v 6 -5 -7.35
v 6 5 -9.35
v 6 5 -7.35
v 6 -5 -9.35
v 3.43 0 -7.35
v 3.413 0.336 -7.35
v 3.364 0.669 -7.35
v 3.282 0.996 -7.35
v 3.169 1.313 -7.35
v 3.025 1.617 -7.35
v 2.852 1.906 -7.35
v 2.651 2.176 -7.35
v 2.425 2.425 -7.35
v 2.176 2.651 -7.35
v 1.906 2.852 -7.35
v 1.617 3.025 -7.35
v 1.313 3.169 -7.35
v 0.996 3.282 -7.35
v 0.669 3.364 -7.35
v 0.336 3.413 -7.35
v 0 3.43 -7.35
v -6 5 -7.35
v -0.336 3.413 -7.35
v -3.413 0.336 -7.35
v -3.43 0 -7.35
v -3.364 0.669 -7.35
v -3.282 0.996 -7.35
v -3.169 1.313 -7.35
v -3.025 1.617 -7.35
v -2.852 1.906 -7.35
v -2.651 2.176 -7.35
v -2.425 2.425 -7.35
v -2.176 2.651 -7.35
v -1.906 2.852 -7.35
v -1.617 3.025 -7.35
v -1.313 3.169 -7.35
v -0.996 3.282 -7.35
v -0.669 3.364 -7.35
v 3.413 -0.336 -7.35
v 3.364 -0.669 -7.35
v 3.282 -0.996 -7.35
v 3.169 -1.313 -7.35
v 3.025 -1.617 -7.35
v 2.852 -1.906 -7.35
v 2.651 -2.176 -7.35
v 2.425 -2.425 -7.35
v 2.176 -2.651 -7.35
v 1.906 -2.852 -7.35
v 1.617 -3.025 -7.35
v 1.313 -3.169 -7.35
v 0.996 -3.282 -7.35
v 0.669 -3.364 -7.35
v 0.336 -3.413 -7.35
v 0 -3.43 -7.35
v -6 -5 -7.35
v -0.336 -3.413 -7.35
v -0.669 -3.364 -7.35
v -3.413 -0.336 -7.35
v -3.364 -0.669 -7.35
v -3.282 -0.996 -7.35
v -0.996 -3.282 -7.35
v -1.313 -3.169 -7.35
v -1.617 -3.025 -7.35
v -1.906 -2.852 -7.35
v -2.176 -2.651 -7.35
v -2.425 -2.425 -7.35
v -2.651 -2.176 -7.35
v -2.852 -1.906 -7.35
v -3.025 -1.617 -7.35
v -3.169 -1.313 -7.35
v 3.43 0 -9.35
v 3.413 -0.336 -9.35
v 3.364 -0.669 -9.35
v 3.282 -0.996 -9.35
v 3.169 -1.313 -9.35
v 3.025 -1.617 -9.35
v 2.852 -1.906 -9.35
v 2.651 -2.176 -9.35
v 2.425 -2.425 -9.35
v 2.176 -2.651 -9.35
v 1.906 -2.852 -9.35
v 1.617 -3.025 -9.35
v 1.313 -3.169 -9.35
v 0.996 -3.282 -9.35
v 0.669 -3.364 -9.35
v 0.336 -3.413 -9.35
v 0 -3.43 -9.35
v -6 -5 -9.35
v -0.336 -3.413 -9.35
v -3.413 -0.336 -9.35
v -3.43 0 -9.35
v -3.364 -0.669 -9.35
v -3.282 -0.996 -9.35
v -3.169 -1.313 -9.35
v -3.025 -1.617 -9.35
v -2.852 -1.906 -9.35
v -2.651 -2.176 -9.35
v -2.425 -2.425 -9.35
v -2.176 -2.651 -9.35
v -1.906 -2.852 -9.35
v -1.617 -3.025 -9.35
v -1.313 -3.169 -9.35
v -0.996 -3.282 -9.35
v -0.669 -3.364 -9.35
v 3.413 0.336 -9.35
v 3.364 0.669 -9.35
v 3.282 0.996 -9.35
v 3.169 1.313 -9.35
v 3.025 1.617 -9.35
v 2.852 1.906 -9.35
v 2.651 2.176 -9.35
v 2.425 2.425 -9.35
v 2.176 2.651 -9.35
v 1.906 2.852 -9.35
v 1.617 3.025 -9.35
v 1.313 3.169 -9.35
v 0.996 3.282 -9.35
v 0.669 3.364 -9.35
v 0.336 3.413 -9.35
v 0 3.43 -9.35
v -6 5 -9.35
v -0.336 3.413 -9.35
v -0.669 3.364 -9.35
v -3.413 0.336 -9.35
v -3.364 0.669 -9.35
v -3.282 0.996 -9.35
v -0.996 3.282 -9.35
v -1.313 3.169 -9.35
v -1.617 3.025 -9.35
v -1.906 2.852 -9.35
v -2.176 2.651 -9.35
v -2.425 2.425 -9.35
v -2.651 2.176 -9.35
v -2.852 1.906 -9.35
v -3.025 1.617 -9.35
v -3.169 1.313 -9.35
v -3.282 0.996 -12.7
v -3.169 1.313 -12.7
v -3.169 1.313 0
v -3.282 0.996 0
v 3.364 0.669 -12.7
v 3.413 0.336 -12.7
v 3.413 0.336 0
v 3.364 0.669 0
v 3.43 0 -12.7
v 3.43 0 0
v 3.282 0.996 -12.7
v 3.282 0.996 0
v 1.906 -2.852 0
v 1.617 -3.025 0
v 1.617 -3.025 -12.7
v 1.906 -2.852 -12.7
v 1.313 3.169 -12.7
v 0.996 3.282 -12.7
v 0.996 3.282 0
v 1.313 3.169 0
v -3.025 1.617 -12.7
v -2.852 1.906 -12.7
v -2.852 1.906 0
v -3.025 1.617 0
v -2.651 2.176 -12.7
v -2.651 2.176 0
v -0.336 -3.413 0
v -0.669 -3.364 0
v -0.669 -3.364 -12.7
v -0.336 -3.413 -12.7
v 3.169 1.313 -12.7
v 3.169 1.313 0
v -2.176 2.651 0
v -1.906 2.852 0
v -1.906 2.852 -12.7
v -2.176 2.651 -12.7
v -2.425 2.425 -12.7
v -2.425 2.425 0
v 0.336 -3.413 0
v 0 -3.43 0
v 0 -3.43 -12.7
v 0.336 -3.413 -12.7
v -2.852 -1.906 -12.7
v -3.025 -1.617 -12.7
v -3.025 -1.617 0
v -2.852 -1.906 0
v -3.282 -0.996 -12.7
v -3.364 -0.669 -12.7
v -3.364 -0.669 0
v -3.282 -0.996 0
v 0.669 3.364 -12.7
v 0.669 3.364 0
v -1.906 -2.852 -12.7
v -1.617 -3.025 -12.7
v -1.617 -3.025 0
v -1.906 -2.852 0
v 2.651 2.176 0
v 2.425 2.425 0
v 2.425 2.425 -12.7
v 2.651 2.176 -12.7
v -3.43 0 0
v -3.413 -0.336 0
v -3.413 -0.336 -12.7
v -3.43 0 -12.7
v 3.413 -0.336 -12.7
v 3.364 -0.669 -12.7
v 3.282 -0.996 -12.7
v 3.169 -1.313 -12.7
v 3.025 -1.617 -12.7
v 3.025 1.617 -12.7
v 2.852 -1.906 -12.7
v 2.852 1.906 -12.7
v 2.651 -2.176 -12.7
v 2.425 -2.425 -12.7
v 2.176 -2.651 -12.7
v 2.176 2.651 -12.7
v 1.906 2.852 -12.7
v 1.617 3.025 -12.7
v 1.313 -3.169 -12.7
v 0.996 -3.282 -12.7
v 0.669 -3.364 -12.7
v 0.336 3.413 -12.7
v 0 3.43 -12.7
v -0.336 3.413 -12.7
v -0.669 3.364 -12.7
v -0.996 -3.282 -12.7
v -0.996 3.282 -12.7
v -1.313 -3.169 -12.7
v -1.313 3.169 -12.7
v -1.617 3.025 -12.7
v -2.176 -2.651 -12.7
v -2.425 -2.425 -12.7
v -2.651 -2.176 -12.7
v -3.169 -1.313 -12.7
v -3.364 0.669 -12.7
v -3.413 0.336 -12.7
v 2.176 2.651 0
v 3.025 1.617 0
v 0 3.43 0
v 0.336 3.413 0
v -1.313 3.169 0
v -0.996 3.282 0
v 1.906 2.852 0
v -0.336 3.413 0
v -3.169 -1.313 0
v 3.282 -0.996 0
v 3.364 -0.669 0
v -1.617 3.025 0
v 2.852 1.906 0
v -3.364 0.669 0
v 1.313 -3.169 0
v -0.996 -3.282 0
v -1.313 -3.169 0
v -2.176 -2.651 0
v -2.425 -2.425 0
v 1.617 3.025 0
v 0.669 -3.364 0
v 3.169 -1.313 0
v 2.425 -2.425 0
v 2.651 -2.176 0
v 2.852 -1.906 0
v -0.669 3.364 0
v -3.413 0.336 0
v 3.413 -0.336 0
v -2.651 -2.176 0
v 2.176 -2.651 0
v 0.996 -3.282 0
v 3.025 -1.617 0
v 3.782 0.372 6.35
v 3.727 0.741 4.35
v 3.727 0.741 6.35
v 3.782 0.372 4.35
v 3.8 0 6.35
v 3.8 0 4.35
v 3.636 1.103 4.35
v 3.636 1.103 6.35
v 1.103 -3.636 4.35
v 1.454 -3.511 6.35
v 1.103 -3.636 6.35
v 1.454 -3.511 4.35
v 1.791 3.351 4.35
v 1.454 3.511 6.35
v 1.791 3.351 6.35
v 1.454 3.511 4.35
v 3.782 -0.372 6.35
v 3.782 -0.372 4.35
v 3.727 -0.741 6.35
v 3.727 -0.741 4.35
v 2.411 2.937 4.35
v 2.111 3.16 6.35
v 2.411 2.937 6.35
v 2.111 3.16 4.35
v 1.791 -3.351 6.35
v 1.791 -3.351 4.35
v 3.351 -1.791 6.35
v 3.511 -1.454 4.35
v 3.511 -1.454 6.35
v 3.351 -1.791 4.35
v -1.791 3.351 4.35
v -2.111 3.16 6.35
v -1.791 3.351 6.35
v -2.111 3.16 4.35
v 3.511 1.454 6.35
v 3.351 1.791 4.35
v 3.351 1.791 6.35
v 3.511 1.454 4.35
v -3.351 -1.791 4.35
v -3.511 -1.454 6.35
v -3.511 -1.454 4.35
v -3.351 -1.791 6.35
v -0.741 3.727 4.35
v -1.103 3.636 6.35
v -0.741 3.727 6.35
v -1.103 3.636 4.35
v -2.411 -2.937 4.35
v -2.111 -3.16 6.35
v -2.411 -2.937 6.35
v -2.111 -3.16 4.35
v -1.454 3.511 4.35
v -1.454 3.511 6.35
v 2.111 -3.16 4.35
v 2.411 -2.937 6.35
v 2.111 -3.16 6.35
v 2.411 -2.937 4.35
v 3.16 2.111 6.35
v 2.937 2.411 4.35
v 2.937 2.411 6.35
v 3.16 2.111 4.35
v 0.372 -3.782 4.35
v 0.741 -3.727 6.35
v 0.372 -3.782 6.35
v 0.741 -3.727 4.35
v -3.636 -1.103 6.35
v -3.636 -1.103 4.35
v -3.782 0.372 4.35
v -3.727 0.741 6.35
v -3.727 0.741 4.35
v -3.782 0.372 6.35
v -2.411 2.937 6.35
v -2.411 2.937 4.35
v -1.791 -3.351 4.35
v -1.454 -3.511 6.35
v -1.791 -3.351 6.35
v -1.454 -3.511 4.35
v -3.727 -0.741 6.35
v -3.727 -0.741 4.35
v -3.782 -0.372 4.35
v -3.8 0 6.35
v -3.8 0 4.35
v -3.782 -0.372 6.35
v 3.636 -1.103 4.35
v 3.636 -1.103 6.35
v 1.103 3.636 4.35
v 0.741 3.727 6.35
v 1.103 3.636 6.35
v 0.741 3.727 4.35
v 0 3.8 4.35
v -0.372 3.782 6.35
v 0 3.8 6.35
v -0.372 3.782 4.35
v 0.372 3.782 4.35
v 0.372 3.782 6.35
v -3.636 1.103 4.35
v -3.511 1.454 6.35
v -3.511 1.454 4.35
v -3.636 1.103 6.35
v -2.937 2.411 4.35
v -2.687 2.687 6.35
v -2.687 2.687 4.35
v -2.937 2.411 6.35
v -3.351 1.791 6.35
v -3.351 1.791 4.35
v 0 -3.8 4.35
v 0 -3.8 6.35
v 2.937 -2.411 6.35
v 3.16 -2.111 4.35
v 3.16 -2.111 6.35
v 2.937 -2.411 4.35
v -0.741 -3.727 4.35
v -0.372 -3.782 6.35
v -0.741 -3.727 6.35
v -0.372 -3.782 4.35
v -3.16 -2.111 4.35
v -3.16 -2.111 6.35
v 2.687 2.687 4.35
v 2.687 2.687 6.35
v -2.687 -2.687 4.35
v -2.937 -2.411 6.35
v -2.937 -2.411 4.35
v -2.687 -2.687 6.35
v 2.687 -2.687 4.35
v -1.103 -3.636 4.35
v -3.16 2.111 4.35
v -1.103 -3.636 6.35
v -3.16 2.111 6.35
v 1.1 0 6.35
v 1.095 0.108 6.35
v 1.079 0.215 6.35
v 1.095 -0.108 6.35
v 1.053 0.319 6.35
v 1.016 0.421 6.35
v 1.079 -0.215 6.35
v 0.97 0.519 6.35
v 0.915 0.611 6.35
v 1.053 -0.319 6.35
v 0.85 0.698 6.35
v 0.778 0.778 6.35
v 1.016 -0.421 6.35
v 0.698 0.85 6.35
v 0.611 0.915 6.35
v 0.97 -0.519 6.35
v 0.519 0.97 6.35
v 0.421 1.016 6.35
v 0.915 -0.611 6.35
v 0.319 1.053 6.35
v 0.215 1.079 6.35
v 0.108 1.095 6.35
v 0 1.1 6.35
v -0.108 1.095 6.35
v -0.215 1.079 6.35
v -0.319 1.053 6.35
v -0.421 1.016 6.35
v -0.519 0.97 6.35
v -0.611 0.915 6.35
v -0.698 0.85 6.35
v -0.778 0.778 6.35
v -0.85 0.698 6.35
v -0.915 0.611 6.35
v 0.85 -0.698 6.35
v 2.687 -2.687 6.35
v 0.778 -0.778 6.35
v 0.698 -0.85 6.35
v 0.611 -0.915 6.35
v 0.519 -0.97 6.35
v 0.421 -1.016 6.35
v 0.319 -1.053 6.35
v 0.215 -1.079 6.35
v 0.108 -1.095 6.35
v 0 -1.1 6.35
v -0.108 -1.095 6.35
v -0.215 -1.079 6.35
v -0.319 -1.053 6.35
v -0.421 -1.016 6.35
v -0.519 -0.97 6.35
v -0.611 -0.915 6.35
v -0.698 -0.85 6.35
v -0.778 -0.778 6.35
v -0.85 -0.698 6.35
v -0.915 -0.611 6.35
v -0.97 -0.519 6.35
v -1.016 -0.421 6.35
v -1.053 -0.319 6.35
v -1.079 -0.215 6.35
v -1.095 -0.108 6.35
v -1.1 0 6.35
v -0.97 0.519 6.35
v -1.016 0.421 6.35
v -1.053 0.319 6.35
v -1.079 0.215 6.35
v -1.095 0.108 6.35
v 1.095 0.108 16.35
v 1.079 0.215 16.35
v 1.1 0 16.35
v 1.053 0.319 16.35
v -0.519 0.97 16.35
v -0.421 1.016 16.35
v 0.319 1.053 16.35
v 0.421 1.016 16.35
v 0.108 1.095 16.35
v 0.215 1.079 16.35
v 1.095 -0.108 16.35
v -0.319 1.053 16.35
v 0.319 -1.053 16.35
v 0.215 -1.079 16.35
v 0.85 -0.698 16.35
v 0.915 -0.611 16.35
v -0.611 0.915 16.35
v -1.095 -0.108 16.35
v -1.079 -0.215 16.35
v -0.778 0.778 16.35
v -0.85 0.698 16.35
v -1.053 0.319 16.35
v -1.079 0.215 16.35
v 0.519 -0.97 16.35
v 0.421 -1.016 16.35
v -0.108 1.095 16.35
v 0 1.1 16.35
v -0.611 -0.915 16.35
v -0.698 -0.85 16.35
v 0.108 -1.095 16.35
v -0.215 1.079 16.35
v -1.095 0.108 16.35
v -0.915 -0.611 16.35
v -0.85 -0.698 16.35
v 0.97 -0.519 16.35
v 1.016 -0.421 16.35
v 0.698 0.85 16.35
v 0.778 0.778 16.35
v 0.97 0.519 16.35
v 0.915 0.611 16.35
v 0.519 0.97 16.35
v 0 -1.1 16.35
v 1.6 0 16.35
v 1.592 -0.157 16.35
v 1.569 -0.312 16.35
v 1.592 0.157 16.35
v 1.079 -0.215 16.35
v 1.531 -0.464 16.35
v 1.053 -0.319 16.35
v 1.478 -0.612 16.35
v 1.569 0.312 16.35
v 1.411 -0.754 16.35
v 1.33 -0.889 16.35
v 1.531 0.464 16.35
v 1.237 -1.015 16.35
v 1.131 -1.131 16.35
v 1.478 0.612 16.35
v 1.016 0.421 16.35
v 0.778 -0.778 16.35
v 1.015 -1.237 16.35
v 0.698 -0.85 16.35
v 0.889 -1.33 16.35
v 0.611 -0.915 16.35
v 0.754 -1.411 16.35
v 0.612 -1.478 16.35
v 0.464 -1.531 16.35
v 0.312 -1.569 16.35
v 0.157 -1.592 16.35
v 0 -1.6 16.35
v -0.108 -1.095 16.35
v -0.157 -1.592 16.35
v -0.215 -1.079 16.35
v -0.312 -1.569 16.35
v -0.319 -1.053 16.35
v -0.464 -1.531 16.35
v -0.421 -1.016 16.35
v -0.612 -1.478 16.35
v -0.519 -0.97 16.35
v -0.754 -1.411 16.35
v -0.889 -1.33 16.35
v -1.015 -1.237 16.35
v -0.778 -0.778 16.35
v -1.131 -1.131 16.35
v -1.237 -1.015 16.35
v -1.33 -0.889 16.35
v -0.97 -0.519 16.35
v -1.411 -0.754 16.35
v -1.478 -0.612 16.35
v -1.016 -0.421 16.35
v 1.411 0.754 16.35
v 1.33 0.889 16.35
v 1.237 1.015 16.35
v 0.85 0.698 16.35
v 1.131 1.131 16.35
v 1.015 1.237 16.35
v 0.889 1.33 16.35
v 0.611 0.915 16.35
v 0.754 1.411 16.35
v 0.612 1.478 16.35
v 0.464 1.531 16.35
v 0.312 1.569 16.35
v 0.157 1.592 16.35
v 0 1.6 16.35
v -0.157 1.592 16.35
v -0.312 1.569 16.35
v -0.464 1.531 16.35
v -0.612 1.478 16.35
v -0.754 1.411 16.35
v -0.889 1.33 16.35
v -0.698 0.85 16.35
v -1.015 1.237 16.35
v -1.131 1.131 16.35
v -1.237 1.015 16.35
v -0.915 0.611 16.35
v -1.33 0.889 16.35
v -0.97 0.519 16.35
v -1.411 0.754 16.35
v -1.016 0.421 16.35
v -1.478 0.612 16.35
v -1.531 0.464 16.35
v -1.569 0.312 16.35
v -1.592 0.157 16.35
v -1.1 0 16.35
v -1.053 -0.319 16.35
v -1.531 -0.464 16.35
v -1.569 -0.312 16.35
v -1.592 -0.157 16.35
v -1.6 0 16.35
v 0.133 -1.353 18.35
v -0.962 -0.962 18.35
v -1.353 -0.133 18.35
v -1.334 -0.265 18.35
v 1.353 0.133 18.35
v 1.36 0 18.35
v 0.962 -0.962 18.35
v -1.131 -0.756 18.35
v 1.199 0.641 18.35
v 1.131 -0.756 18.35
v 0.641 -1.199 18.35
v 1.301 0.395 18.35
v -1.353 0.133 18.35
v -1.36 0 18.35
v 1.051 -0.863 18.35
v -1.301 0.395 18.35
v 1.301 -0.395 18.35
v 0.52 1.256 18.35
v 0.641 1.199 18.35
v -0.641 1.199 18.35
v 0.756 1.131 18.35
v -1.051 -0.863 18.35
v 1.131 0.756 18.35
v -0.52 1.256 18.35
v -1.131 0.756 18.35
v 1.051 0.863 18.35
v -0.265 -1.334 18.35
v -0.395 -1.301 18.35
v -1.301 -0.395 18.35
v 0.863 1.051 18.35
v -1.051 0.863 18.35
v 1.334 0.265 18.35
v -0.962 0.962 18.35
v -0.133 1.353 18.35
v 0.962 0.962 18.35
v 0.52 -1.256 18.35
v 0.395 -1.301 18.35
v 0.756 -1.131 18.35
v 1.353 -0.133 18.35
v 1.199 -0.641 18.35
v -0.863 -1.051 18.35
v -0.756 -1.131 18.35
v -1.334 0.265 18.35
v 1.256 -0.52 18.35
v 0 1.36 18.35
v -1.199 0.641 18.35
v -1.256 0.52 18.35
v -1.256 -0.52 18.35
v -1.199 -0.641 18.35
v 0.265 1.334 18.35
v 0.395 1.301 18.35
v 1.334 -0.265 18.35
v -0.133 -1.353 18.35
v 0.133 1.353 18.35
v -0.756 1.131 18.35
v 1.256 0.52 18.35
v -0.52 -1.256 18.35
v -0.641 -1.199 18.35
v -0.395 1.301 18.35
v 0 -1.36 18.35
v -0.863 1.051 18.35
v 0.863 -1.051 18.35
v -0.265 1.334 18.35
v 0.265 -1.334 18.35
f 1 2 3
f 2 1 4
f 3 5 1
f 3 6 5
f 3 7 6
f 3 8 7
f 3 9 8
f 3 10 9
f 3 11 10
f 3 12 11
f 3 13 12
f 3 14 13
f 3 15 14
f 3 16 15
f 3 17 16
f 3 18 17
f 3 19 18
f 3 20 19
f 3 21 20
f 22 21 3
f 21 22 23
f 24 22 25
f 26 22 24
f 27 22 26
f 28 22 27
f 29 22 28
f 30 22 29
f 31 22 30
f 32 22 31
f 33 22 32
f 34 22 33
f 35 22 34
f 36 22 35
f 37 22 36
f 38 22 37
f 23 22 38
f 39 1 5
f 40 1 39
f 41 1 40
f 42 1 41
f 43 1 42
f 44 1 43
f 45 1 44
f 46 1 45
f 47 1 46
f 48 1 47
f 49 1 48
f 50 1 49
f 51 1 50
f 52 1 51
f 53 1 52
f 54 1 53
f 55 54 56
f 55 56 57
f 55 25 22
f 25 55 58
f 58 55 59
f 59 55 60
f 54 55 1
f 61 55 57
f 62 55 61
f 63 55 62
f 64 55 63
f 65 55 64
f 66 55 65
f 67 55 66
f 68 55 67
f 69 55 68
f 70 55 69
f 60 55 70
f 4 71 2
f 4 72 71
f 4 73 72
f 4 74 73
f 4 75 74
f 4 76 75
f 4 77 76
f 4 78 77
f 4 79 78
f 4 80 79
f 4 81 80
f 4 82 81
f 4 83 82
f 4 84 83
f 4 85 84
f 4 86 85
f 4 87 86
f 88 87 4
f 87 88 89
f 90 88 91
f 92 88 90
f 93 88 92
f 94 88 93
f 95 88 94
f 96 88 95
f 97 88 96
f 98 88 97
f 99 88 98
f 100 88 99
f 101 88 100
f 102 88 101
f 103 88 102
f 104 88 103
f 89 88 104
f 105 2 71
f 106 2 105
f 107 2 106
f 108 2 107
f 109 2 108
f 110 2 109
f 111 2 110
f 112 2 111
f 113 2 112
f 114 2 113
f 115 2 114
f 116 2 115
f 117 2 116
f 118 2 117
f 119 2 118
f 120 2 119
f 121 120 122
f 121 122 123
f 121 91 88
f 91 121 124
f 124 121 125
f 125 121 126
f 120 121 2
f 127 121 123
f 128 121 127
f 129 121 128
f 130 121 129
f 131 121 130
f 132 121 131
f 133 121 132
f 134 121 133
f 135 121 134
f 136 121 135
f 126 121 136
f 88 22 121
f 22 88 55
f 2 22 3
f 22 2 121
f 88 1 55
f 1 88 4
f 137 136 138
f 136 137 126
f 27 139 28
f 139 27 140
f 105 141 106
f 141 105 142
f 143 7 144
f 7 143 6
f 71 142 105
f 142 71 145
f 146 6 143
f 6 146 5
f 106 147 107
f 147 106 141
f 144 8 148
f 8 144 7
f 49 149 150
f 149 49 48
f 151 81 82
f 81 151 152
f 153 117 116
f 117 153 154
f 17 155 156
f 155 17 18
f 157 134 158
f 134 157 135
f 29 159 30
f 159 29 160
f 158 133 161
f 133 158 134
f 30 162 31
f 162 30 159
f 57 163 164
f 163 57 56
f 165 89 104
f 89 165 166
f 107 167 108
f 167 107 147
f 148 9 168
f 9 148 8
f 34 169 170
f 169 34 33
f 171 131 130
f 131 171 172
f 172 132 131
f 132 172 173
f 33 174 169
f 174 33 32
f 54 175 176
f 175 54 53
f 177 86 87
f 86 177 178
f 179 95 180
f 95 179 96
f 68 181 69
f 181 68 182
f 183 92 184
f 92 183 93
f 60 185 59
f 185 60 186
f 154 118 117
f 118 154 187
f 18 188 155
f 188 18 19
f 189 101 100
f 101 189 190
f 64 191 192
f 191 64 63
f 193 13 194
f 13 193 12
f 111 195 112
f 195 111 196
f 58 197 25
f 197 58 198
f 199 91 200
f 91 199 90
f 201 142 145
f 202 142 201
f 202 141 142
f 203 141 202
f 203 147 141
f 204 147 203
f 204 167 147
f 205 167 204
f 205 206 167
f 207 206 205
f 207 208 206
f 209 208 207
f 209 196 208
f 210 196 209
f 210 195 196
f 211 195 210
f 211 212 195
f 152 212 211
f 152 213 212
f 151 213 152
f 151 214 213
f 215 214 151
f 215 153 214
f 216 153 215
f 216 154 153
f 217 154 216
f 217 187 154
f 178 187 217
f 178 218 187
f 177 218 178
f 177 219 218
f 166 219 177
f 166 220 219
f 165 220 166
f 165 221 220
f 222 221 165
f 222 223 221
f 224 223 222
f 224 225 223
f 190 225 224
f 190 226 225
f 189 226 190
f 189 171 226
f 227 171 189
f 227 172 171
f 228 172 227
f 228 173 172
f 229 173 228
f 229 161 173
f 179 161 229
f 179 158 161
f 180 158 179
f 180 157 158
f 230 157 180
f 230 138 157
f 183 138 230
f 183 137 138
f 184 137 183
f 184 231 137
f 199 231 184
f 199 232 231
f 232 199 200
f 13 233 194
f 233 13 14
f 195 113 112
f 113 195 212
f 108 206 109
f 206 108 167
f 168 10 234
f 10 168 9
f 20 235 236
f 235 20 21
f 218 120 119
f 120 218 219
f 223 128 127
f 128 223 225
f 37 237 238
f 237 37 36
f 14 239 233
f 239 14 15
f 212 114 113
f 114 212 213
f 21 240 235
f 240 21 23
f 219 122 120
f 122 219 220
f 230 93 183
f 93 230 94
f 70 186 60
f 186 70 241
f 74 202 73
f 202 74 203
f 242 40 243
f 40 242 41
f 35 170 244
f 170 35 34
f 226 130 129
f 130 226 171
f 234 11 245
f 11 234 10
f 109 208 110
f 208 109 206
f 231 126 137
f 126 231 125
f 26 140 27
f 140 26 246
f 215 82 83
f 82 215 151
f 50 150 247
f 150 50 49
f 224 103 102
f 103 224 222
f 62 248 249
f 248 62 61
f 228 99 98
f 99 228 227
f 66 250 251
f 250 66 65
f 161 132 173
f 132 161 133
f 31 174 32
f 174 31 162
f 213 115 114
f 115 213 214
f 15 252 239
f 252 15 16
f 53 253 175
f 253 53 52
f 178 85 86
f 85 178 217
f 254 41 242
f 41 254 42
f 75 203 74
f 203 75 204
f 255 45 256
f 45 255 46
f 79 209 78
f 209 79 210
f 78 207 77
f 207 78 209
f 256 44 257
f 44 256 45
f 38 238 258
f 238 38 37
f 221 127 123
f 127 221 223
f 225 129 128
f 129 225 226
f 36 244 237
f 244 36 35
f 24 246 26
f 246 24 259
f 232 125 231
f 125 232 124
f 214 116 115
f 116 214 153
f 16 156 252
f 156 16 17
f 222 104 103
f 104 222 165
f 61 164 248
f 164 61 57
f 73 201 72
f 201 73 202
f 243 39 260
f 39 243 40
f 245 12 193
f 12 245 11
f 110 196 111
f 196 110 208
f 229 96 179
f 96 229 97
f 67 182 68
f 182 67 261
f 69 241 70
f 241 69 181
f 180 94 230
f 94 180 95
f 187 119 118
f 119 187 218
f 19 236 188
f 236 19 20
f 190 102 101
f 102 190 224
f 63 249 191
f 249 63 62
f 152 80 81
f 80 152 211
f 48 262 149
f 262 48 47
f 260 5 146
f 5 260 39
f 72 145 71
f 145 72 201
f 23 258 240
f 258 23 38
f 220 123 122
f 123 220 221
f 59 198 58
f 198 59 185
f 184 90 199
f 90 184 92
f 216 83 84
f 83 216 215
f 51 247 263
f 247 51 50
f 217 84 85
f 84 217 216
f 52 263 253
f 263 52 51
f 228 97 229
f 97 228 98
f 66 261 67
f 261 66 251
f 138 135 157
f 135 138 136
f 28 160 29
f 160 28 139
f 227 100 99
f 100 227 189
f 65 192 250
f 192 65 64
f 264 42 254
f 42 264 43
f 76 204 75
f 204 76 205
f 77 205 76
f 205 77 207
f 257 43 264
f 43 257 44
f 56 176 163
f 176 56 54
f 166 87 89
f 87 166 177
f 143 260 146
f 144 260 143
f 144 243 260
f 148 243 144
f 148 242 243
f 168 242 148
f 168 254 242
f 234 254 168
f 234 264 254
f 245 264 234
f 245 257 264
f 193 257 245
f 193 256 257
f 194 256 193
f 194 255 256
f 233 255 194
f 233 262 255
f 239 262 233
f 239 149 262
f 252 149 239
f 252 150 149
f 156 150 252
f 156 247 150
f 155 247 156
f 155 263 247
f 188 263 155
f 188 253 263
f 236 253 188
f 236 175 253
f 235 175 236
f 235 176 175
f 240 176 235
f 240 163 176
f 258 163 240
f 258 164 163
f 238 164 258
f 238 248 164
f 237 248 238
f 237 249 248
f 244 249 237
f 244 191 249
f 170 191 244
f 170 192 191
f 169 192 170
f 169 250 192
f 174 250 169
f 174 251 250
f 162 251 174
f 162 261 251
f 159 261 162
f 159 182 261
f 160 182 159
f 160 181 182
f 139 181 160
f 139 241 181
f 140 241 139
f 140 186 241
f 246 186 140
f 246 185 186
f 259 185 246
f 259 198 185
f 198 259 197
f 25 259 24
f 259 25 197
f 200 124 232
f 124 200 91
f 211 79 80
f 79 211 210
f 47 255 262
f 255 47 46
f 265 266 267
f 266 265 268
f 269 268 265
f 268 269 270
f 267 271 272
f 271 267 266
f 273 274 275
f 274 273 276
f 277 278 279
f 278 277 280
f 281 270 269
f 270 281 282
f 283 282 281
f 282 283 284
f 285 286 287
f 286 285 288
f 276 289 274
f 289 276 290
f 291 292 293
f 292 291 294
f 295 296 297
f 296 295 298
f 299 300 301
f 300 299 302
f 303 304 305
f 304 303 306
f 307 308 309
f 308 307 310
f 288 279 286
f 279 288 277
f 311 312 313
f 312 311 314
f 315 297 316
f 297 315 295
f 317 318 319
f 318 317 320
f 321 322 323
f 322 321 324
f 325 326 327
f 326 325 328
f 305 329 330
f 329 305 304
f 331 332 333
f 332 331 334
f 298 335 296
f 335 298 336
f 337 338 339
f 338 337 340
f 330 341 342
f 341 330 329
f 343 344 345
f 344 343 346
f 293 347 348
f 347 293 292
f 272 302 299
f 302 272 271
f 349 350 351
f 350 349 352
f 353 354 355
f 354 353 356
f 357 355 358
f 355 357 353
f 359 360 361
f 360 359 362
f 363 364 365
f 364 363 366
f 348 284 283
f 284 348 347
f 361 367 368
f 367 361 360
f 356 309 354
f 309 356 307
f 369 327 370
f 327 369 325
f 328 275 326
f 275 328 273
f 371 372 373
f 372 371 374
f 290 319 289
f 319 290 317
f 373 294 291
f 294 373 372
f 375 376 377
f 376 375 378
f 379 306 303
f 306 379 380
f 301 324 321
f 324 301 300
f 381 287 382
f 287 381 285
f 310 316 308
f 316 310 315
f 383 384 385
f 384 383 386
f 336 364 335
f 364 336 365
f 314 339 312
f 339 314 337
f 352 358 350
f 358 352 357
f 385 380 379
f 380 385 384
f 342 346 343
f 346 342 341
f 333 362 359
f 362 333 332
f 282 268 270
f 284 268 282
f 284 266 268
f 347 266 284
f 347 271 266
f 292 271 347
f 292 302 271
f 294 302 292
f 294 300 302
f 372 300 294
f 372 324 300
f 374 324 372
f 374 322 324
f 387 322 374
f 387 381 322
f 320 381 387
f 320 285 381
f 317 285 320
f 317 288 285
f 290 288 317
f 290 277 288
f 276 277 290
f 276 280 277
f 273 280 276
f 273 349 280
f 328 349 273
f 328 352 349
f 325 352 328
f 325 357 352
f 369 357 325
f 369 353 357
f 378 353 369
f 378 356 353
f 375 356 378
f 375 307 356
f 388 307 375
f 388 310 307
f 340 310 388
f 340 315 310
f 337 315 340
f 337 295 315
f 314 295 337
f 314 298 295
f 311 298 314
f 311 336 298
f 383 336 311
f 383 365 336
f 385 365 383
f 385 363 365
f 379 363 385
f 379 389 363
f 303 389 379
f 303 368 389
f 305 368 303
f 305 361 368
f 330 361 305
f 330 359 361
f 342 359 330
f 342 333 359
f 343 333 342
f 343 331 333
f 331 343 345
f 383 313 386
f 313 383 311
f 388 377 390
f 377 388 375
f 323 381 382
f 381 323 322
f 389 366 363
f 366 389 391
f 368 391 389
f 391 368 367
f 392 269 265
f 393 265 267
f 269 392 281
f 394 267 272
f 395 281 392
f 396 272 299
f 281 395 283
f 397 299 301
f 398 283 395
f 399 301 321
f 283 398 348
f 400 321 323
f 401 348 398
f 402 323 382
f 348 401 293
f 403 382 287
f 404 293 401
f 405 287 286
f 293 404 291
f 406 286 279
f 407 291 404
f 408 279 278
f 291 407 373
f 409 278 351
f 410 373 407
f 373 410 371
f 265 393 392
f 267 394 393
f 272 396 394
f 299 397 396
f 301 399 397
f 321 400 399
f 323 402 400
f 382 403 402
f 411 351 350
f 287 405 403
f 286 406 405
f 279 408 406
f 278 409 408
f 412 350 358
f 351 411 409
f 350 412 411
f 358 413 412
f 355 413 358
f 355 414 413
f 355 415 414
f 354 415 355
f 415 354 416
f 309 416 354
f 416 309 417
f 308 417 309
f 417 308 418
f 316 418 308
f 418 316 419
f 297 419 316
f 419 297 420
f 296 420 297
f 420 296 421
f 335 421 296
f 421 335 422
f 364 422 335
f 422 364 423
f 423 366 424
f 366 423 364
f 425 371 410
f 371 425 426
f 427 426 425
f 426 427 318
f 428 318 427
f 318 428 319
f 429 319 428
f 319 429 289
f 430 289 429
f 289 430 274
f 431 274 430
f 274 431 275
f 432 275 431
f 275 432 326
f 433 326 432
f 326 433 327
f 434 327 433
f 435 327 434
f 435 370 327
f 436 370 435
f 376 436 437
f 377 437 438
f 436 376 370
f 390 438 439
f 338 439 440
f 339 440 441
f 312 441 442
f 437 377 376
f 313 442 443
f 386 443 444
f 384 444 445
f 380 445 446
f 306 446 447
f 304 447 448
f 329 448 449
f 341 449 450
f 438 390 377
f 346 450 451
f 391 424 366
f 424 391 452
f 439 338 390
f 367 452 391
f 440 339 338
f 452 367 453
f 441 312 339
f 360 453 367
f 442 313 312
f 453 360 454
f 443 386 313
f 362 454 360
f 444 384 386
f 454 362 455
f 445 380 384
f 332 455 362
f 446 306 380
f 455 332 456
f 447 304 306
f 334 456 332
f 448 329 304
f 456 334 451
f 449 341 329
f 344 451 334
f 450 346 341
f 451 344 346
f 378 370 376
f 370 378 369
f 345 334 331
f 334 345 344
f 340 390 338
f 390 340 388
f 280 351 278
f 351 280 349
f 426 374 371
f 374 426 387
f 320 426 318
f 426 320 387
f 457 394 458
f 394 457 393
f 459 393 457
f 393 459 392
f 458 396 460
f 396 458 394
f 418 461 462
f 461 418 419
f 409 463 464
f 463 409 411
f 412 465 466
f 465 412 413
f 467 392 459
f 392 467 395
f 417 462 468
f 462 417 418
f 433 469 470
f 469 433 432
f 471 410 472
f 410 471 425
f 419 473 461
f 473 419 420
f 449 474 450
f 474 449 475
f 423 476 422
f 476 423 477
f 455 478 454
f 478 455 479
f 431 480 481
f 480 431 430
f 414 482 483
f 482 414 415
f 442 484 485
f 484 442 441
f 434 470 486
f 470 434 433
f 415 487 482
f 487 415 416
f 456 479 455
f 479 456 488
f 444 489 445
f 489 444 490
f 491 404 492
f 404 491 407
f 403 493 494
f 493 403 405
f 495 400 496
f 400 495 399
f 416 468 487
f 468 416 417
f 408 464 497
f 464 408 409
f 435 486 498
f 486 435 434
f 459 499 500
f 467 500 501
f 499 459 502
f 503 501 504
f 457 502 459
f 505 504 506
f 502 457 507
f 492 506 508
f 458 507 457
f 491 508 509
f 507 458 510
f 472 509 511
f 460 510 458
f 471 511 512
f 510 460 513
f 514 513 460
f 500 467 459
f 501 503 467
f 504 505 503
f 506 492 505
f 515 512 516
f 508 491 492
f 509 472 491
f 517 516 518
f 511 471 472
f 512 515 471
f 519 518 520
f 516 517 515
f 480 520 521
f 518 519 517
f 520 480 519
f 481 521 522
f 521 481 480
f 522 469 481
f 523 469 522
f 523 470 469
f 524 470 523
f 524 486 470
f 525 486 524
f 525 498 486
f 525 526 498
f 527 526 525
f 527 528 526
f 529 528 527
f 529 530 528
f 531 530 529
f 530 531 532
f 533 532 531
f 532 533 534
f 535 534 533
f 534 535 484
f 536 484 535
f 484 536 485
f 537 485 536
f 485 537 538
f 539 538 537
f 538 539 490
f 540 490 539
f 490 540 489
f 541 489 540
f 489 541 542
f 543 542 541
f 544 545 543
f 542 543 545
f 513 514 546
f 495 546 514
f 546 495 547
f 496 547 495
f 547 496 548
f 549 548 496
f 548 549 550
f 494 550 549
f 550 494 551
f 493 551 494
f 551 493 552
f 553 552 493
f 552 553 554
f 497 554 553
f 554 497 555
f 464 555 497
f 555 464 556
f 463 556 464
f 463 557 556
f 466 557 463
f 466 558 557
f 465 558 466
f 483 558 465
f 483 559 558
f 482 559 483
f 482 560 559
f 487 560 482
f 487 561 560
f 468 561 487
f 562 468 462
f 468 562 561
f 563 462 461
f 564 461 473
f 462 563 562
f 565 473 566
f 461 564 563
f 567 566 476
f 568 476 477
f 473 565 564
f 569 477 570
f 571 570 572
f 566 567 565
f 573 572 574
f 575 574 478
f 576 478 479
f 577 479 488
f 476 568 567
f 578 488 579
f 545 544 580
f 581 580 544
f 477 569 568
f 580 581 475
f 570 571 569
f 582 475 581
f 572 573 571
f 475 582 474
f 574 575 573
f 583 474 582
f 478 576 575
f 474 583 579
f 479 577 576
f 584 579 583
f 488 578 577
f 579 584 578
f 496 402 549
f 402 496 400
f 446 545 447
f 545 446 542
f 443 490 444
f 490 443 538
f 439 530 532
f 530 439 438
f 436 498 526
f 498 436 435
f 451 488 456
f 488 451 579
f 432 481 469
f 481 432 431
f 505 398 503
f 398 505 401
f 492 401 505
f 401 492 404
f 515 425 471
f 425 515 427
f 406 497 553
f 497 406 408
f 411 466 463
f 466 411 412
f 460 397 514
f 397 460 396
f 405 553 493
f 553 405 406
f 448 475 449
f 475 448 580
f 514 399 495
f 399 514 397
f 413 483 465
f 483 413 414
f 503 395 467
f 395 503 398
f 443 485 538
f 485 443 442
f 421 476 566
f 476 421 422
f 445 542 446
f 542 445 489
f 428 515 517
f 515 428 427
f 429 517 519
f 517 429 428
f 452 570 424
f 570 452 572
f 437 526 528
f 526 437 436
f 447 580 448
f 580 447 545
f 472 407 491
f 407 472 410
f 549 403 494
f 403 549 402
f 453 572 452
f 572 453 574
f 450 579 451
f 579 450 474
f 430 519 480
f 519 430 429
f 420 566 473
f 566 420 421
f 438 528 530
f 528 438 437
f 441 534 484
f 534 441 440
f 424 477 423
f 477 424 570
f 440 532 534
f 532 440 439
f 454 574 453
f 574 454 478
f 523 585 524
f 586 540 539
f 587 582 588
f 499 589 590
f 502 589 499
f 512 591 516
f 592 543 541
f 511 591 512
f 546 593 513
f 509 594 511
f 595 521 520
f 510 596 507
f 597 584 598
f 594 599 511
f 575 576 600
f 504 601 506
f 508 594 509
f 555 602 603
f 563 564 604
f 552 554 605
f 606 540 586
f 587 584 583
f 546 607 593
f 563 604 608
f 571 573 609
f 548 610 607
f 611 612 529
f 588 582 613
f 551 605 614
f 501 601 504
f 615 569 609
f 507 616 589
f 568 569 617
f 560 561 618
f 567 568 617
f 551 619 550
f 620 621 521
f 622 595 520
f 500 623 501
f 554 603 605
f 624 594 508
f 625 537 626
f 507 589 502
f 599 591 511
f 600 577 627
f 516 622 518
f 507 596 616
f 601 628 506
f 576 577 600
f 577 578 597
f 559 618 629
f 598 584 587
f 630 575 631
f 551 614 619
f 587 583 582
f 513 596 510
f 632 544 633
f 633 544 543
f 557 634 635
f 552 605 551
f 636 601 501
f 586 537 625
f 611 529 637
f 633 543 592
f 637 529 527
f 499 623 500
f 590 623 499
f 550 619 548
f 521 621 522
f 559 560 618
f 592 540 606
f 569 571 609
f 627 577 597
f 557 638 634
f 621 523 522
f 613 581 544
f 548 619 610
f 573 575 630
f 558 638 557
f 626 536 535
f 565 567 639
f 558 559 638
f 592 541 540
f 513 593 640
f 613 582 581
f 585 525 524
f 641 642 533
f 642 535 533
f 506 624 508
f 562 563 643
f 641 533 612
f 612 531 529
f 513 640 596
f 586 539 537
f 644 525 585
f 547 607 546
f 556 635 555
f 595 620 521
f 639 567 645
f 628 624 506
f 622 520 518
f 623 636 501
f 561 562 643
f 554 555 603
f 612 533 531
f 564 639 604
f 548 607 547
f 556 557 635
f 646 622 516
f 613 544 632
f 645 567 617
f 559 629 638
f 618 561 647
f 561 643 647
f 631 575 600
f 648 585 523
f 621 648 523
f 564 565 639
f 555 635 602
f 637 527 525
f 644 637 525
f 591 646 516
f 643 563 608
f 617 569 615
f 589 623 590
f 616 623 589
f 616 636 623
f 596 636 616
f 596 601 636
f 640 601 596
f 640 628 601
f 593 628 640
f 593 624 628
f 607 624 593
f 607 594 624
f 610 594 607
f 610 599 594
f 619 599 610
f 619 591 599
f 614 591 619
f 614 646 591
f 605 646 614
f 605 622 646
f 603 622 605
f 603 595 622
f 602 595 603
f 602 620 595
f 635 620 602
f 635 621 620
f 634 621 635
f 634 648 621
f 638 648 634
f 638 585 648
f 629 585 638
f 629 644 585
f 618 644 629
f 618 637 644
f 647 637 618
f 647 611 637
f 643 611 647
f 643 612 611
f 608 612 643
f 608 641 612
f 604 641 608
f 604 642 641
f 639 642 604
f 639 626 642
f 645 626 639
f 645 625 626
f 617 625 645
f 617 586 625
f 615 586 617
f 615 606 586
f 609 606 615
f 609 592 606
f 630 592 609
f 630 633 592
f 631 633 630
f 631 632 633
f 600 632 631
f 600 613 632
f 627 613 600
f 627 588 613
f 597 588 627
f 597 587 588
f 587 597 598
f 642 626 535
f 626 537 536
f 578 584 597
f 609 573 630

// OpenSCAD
$fn=64;

body_d = 6.86;
body_r = body_d/2;
body_h = 12.7;

bushing_d = 7.6;
bushing_h = 2.0;

lever_d = 2.2;
lever_h = 10.0;

tip_d = 3.2;
tip_h = 2.0;

base_plate_w = 12.0;
base_plate_d = 10.0;
base_plate_h = 2.0;

module toggle_switch() {
    union() {
        translate([0,0,-(base_plate_h + body_h/2)])
            cube([base_plate_w, base_plate_d, base_plate_h], center=true);

        translate([0,0,-body_h/2])
            cylinder(d=body_d, h=body_h, center=true);

        translate([0,0,body_h/2 - bushing_h/2])
            cylinder(d=bushing_d, h=bushing_h, center=true);

        translate([0,0,body_h/2 + lever_h/2])
            cylinder(d=lever_d, h=lever_h, center=true);

        translate([0,0,body_h/2 + lever_h + tip_h/2])
            cylinder(d1=tip_d, d2=tip_d*0.85, h=tip_h, center=true);
    }
}

toggle_switch();
